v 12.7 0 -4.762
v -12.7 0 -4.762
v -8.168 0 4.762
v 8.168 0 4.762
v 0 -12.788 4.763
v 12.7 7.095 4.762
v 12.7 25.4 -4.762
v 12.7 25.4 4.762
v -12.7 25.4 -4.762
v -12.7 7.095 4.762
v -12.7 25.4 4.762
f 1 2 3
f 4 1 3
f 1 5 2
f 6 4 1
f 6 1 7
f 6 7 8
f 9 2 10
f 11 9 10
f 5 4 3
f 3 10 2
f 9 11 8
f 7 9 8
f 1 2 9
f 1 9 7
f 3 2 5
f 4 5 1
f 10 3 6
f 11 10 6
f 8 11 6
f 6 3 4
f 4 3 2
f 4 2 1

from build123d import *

# Parameters (mm, degrees)
F0_W     = 25.4
F0_H     = 9.525
F1_DEPTH = 25.4
F3_DEPTH = 25.4
F5_DEPTH = 33.9526981115


with BuildPart() as f1:
    # F0 (on Front) → F1 (new body)
    with BuildSketch(Plane.XZ):
        Rectangle(F0_W, F0_H)
    extrude(amount=-F1_DEPTH)


with BuildPart() as f3:
    # F2 (on face) → F3 (new body)
    with BuildSketch(Plane.YZ.offset(12.7)):
        Polygon((0, -4.7625), (0, 4.7625), (-12.7879343927, 4.7625), align=None)
    extrude(amount=-F3_DEPTH)


with BuildPart() as f5_tool:
    # F4 (on face) → F5 (new body)
    with BuildSketch(Plane(origin=(0, -2.2815376518, -3.0631132604), x_dir=(1, 0, 0), z_dir=(0, -0.5973496564, -0.801980915))):
        Polygon((-12.7, -2.8448777385), (0, 13.1005570637), (-12.7, 13.1005570637), align=None)
        Polygon((0, 13.1005570637), (12.7, -2.8448777385), (12.7, 13.1005570637), align=None)
    extrude(amount=-F5_DEPTH)


with BuildPart() as f1_1:
    add(f1.part)

    # F5: cut by f5_tool
    add(f5_tool.part, mode=Mode.SUBTRACT)


with BuildPart() as f3_1:
    add(f3.part)

    # F5: cut by f5_tool
    add(f5_tool.part, mode=Mode.SUBTRACT)


solid = Compound([f1_1.part, f3_1.part])
